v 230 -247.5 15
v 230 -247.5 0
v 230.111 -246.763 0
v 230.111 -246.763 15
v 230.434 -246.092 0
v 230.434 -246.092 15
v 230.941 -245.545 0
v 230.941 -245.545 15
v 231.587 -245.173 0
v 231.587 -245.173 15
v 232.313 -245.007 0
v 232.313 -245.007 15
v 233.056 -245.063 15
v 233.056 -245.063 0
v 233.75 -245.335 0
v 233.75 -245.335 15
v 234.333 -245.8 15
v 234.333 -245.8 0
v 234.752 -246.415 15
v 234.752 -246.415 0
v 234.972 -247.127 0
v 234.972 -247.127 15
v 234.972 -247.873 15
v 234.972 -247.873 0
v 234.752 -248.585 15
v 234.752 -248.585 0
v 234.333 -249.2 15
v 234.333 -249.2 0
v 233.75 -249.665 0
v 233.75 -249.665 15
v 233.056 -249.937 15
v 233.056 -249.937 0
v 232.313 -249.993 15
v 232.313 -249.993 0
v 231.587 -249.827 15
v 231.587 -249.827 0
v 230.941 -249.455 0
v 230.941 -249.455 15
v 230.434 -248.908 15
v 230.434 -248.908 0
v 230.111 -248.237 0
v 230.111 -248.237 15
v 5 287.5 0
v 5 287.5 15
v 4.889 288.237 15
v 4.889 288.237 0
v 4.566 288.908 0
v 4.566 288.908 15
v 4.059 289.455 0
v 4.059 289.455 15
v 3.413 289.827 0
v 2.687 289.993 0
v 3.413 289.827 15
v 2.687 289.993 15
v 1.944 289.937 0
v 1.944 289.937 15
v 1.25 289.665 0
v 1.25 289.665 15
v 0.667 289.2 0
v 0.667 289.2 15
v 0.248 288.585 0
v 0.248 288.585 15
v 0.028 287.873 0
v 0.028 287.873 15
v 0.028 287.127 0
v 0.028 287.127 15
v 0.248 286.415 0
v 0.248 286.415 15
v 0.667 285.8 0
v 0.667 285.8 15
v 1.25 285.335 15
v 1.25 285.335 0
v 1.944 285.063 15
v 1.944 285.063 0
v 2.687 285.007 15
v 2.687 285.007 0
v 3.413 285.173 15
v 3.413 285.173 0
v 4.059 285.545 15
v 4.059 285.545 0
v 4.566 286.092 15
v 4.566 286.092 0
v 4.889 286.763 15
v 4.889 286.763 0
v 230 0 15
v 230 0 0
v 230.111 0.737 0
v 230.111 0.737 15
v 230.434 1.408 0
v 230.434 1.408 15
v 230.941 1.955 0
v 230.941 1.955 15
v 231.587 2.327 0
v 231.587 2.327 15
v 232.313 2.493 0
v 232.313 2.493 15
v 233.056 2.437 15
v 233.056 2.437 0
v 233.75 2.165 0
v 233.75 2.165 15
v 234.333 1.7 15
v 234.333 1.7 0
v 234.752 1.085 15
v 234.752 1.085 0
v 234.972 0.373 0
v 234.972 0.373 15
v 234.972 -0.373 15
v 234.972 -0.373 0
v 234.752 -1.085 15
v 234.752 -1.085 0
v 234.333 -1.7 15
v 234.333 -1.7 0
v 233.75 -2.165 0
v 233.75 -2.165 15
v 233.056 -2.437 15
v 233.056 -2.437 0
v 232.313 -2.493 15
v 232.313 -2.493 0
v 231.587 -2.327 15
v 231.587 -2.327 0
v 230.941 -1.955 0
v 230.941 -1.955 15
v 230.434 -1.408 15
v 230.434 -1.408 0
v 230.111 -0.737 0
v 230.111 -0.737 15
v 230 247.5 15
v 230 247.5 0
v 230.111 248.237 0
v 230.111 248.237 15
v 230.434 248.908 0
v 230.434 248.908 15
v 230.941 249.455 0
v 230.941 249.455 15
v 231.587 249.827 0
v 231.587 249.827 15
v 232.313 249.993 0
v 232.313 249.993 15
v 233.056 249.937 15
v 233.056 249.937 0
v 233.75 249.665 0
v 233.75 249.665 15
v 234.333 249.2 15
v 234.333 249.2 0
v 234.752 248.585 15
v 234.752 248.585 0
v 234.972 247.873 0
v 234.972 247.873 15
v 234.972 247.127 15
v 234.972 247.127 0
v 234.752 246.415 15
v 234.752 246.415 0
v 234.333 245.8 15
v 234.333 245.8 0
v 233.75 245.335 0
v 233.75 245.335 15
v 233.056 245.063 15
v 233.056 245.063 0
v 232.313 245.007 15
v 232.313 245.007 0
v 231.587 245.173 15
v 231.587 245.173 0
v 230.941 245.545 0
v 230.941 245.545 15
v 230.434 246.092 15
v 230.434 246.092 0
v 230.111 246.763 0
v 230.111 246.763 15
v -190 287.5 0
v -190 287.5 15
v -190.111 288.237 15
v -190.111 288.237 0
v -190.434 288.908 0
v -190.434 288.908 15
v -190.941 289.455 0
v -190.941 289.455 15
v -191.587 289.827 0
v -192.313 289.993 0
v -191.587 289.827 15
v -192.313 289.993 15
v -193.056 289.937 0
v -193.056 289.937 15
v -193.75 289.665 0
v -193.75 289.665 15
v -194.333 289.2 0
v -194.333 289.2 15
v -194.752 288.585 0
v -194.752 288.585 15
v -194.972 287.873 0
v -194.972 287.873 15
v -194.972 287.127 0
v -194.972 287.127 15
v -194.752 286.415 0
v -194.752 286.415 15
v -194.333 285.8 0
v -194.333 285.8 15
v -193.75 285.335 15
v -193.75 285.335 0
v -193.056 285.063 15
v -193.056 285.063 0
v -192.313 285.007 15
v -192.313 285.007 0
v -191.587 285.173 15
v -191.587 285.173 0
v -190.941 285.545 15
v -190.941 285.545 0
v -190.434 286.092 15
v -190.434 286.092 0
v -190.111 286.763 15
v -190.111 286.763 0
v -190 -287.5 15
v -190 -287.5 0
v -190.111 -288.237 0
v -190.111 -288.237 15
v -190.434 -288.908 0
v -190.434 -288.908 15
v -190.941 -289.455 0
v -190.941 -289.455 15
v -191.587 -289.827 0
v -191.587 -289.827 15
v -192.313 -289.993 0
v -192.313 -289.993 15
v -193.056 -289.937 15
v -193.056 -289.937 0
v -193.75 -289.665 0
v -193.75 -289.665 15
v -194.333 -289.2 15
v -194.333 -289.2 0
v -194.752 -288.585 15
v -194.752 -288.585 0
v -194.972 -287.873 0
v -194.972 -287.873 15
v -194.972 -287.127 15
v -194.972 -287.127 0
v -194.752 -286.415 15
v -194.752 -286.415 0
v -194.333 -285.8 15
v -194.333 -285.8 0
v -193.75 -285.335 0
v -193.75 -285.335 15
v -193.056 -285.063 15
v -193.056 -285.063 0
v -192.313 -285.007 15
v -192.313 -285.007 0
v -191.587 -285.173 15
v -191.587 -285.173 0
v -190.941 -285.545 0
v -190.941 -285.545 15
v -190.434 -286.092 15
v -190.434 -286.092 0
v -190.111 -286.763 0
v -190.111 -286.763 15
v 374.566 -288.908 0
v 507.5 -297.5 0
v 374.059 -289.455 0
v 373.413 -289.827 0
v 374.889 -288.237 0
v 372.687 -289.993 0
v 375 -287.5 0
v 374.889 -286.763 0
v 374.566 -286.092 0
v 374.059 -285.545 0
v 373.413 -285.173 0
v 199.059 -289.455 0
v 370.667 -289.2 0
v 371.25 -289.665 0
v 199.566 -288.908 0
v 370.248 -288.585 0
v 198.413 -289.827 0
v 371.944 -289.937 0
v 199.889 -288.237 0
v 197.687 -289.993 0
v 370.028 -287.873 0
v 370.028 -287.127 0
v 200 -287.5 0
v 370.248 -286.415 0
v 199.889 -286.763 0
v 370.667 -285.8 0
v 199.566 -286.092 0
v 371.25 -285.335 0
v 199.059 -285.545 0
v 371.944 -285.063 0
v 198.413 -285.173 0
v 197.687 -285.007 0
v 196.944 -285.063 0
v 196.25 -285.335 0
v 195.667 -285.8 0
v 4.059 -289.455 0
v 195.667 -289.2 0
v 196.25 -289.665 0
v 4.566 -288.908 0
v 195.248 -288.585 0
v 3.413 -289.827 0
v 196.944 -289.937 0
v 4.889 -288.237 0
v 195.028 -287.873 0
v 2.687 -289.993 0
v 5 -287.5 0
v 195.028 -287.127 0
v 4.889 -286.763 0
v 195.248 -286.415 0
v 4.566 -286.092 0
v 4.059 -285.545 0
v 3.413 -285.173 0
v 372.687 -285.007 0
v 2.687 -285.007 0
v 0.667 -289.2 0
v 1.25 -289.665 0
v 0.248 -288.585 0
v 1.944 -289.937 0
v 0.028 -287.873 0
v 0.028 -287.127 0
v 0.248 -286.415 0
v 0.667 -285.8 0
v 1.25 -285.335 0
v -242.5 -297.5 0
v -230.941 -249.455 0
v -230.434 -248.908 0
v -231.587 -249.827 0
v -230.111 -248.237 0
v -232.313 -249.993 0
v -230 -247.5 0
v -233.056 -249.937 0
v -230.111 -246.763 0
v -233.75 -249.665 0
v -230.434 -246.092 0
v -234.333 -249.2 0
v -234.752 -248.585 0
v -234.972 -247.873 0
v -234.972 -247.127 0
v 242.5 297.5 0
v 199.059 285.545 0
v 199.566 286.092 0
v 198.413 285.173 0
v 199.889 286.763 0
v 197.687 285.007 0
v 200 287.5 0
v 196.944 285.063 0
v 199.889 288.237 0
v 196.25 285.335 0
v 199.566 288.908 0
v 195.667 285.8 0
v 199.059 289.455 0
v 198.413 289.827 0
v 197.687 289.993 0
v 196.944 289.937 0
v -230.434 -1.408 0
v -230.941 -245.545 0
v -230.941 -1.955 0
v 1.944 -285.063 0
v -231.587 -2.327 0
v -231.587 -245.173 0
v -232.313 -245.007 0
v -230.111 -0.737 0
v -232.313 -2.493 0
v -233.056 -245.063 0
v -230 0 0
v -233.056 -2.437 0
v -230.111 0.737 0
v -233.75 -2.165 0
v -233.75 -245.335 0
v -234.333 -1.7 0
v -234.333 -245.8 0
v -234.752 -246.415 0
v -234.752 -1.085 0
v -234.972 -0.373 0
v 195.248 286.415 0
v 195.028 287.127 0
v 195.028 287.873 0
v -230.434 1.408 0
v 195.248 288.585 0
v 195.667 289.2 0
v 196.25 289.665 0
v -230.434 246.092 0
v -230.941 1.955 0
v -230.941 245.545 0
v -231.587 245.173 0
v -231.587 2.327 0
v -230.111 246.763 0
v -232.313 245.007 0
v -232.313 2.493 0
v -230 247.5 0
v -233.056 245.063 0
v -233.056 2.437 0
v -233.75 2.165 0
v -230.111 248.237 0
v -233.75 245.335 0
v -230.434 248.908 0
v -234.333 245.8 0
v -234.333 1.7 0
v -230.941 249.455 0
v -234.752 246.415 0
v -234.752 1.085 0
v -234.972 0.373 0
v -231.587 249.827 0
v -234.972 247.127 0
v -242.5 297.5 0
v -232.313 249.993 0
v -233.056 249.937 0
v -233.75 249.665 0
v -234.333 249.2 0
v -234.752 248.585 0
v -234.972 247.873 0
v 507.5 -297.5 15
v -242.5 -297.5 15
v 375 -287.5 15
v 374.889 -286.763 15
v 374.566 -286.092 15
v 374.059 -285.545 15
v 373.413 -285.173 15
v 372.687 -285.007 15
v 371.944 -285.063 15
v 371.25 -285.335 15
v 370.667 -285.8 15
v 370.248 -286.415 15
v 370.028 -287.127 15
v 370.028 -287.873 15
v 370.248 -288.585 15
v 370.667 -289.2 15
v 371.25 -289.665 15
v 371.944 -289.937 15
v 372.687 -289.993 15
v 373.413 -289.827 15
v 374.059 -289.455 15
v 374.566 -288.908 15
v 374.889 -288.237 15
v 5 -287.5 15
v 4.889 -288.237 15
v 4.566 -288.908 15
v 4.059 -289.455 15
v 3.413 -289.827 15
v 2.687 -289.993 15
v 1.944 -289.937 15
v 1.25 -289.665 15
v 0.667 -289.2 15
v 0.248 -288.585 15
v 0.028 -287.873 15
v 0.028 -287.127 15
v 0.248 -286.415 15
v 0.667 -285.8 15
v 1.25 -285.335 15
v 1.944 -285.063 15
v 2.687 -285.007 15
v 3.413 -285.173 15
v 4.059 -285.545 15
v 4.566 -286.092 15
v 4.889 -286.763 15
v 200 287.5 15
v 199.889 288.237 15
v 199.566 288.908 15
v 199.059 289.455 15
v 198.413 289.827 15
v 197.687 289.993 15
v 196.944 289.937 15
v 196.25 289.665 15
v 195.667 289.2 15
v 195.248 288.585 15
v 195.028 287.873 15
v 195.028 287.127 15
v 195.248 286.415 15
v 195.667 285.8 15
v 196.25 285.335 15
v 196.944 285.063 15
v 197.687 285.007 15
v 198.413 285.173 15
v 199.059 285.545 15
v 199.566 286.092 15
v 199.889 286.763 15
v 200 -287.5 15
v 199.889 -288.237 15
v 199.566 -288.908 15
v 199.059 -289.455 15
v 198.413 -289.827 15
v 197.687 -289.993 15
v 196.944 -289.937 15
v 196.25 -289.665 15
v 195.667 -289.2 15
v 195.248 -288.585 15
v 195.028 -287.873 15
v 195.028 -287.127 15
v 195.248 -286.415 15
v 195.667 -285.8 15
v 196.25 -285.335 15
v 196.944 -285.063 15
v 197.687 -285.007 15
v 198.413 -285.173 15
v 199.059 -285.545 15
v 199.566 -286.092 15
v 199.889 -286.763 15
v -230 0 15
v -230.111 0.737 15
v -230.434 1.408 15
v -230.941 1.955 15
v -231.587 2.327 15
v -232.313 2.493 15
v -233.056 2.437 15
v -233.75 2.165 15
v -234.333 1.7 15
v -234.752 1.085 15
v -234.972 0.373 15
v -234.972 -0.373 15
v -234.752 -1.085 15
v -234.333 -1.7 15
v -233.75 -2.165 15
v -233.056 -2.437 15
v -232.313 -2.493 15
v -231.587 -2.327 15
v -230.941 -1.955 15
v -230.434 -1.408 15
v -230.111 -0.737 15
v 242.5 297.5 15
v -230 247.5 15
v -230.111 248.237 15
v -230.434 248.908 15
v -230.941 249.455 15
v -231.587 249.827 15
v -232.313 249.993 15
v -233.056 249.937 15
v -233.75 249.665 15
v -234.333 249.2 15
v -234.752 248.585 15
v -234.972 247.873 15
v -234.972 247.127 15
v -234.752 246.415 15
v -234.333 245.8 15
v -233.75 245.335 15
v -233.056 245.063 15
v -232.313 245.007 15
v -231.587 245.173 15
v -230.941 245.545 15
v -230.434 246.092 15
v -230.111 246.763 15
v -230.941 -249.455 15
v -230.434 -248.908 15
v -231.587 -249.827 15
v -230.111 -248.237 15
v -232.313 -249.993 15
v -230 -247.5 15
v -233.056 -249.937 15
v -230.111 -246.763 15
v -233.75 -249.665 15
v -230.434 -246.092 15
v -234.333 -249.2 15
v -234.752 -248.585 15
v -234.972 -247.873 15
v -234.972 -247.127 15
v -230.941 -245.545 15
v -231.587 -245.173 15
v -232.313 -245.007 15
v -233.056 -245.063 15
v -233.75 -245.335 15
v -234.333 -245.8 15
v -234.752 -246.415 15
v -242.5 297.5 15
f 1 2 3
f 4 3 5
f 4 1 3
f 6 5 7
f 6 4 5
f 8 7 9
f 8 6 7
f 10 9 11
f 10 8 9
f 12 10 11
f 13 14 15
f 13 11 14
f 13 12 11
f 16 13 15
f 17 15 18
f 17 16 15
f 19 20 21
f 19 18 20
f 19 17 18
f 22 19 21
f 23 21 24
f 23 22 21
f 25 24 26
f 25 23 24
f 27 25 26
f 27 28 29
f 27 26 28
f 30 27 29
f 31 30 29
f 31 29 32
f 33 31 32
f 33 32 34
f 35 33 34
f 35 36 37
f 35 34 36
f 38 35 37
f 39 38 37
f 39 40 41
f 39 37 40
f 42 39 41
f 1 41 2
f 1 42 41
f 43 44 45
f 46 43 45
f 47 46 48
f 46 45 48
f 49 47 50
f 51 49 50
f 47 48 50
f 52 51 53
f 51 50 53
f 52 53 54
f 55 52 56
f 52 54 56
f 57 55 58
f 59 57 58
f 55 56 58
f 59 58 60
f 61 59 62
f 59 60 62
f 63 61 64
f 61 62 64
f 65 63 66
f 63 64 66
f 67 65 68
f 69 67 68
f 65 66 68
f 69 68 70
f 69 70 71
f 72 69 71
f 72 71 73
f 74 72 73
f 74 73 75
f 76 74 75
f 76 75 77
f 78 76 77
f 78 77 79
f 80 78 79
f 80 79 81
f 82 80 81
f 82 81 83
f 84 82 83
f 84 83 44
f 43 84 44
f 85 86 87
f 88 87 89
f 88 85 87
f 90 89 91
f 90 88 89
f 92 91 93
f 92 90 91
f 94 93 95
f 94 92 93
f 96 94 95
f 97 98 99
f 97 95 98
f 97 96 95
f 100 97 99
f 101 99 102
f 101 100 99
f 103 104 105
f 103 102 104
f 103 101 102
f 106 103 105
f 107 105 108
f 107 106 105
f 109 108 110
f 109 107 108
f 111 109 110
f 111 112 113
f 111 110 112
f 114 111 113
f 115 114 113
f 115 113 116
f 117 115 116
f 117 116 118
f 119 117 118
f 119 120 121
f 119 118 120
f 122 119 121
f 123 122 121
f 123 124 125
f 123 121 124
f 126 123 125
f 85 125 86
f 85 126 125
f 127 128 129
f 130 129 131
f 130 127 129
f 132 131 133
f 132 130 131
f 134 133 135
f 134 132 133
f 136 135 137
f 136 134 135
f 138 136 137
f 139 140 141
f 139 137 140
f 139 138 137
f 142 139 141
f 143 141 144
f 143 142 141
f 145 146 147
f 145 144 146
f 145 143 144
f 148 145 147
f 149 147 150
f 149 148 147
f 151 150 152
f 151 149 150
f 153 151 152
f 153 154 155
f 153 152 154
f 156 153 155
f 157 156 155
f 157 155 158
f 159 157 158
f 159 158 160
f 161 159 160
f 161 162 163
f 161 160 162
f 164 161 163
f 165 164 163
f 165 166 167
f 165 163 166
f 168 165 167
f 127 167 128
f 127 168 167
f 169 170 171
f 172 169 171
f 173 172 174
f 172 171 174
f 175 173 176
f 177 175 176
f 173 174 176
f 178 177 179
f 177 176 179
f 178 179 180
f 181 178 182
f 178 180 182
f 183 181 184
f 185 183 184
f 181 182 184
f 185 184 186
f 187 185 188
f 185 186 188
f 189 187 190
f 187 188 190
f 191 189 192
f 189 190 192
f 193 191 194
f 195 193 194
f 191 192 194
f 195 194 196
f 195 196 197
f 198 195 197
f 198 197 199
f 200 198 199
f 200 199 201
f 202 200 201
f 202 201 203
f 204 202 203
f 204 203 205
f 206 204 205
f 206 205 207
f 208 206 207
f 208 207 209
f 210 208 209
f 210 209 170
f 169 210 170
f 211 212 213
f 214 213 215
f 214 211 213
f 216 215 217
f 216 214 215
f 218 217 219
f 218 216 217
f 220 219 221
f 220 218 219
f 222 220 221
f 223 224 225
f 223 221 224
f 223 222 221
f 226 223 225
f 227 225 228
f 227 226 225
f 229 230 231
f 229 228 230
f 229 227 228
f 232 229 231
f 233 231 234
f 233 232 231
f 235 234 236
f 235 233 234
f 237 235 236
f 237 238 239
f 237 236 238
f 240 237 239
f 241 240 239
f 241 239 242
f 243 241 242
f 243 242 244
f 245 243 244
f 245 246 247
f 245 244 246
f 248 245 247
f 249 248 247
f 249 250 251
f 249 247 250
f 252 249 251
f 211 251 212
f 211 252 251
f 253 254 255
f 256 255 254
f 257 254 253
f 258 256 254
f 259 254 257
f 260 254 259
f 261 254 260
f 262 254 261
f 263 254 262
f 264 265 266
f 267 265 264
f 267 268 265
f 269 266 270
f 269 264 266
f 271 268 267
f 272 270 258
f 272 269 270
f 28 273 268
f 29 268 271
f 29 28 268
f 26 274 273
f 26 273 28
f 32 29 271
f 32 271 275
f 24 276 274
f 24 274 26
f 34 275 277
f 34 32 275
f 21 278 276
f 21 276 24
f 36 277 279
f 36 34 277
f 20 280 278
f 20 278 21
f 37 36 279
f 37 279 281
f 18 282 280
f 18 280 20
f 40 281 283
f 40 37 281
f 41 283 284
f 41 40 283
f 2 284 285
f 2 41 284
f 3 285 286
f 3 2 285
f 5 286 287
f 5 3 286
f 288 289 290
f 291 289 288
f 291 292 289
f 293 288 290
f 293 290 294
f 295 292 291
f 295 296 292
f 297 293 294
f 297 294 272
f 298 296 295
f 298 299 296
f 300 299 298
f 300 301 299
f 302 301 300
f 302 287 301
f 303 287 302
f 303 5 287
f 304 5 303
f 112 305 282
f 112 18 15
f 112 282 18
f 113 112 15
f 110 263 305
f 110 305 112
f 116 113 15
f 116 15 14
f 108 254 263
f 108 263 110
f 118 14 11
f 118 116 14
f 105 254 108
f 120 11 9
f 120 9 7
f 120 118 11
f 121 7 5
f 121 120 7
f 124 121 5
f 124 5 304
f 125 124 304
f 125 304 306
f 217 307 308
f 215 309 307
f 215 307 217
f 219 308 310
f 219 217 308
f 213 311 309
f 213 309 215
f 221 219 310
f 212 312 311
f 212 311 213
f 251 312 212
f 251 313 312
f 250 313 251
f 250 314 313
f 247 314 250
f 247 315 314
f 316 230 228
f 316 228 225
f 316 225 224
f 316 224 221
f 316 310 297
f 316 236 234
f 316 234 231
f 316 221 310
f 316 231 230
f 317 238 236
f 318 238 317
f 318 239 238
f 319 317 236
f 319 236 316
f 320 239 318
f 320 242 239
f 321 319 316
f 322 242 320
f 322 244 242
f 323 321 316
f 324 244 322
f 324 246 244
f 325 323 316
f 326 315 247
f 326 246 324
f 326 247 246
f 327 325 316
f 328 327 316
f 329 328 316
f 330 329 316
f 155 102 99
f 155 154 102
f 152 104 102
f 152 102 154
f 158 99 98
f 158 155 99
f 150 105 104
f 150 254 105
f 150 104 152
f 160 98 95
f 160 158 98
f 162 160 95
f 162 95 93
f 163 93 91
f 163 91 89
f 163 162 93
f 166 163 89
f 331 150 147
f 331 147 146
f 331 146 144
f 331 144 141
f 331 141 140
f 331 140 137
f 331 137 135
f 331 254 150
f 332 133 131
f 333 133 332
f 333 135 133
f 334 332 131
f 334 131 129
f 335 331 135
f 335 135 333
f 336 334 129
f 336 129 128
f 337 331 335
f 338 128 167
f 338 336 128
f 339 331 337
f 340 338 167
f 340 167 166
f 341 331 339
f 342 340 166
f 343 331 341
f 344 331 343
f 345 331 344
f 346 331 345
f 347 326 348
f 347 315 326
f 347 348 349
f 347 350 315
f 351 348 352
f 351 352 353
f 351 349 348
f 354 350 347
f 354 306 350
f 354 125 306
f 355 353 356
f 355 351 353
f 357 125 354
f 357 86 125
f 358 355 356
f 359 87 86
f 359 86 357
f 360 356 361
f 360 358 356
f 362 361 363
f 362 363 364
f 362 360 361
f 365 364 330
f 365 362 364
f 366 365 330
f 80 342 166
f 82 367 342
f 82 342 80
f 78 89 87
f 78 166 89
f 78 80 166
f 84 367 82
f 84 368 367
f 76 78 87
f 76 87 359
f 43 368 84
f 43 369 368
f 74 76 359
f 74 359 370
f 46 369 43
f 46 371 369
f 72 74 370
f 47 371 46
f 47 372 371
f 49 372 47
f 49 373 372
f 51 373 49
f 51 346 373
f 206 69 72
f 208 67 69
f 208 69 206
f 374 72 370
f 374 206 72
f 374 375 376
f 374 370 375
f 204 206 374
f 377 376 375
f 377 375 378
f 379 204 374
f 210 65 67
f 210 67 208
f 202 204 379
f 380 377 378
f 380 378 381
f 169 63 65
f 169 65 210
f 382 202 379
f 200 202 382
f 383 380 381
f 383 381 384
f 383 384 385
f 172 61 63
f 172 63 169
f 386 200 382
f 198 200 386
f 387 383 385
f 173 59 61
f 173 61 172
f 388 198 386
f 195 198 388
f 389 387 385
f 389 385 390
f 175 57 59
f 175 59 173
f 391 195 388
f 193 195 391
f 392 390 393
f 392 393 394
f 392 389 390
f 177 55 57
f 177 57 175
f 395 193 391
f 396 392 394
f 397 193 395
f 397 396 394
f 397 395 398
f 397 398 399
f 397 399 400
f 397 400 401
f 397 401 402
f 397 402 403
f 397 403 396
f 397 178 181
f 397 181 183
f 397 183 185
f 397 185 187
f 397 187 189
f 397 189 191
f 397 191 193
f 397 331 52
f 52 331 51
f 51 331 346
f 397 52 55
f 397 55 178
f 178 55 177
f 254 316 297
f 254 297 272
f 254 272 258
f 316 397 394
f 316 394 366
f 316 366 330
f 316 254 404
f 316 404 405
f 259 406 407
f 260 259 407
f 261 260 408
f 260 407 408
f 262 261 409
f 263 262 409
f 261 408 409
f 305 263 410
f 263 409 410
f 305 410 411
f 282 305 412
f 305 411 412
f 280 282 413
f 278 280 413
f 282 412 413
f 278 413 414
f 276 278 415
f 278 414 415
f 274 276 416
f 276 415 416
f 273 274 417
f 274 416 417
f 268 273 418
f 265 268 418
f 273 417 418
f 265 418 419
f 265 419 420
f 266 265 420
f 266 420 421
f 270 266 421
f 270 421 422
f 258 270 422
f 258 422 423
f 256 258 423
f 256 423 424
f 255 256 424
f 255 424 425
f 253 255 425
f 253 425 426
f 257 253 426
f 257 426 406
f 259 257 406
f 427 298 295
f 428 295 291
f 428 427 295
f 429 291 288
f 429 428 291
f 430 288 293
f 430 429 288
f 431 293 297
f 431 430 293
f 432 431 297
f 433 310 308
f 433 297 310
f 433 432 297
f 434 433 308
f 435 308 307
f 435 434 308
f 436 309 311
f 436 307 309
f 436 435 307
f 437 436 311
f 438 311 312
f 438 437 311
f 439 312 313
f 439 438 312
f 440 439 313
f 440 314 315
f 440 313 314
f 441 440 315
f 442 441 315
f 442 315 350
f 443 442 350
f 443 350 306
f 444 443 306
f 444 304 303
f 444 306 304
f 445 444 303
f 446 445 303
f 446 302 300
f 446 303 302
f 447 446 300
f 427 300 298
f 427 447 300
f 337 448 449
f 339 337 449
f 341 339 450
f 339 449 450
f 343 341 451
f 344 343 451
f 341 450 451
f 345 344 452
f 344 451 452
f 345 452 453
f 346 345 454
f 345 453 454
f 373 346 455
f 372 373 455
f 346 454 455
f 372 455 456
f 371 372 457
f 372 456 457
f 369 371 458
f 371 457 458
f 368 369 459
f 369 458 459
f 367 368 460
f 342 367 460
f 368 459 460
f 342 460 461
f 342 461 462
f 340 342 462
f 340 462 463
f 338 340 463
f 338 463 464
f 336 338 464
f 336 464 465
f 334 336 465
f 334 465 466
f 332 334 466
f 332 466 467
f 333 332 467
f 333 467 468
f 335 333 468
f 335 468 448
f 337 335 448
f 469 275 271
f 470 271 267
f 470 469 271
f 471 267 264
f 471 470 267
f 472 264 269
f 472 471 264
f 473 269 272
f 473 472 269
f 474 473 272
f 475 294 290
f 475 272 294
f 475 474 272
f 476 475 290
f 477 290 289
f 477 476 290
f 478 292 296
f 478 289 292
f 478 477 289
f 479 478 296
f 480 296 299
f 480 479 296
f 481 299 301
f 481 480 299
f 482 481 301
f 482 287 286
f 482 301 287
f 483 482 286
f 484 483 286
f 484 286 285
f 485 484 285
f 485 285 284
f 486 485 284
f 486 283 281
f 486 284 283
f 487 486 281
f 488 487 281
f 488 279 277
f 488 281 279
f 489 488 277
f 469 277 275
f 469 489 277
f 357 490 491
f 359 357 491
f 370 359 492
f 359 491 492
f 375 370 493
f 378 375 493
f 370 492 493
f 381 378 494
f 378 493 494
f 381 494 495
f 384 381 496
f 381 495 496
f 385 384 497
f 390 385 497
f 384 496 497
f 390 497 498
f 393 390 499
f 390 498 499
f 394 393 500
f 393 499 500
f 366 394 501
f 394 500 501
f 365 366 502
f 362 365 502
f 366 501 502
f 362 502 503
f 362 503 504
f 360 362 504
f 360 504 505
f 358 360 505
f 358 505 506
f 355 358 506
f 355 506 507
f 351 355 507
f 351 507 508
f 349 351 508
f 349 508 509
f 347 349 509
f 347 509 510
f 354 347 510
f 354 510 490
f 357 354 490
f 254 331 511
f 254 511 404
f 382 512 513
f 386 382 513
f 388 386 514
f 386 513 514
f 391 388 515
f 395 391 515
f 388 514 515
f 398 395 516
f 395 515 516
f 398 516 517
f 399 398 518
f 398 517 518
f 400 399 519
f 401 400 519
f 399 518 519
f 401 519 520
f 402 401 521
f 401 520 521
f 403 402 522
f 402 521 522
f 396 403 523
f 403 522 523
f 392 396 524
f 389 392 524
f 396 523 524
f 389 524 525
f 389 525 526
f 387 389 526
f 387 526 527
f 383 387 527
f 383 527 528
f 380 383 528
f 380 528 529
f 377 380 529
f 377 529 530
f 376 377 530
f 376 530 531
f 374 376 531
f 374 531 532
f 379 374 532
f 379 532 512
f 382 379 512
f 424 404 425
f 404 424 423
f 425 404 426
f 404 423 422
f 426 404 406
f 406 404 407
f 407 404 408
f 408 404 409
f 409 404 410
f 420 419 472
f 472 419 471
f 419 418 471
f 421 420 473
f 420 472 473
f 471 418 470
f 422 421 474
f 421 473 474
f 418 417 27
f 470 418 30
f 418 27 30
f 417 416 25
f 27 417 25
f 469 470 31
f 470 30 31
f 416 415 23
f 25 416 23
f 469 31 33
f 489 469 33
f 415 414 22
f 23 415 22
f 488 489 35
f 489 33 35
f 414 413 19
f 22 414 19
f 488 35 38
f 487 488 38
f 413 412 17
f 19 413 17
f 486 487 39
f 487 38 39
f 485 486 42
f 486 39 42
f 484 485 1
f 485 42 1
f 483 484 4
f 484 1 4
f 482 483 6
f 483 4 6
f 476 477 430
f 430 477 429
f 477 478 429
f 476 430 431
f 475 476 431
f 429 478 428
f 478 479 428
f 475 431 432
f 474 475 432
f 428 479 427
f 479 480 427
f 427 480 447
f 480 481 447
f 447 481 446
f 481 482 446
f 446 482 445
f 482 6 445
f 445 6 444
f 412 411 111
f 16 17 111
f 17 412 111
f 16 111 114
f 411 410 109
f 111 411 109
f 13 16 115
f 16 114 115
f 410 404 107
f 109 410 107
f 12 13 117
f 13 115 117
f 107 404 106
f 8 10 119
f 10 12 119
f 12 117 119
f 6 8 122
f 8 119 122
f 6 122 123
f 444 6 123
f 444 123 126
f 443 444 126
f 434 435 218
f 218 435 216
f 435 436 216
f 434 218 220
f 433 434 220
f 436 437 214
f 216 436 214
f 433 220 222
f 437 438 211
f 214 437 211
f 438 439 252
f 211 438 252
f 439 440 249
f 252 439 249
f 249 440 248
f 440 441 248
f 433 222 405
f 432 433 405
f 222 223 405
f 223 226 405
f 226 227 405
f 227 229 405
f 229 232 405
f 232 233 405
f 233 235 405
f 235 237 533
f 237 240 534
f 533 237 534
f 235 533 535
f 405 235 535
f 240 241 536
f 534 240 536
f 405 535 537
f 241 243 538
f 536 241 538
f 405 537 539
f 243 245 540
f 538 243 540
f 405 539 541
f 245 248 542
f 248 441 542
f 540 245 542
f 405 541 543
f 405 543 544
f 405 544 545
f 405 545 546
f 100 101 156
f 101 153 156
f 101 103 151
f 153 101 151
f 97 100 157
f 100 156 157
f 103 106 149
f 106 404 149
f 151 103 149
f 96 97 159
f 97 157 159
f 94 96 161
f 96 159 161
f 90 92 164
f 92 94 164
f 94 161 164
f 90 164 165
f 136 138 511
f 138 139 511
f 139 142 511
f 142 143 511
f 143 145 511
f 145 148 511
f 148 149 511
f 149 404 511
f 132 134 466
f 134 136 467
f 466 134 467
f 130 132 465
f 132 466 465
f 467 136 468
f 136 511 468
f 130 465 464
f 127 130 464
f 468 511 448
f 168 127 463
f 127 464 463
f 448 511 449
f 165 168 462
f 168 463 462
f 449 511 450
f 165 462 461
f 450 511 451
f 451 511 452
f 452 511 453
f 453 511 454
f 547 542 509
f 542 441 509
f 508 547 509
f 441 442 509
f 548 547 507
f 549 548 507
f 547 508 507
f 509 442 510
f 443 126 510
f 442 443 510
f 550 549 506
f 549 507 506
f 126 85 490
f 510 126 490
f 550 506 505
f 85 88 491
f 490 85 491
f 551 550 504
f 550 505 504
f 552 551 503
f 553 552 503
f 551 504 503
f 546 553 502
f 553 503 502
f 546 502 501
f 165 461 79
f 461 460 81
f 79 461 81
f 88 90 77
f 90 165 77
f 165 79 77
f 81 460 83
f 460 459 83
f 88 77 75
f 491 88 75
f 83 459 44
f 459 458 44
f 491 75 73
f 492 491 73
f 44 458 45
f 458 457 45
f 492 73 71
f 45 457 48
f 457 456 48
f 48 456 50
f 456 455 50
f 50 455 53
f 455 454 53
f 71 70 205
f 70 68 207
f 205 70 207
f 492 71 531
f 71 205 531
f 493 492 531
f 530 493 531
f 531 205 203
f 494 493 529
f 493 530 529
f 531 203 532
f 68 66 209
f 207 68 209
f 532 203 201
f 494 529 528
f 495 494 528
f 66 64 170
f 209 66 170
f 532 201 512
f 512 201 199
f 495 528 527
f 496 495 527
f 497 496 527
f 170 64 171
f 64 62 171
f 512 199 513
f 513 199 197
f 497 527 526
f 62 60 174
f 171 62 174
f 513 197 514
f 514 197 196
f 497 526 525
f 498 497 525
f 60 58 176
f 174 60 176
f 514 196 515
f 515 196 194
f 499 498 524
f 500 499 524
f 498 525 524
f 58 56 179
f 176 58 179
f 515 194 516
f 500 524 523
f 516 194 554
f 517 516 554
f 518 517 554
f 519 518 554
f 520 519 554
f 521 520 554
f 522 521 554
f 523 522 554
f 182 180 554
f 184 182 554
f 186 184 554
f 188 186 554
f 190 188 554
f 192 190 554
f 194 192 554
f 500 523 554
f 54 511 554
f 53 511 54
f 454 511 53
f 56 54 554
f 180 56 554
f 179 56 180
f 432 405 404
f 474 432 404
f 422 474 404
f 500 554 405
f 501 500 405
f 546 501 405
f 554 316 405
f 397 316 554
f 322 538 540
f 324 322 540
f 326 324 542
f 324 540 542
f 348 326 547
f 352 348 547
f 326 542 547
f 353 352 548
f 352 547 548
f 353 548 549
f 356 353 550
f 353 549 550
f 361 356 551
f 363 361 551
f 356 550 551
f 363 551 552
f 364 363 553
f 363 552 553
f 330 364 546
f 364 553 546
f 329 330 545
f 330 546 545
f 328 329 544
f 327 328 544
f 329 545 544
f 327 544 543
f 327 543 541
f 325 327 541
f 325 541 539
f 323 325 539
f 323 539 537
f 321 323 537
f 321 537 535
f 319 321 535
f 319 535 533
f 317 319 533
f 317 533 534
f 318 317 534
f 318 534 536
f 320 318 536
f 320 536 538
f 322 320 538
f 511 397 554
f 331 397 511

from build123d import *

# Parameters (mm, degrees)
EXTRUDE_1_DEPTH     = 15
SKETCH_2_R          = 2.5
CUT_EXTRUDE_1_DEPTH = 589.461978381
SKETCH_2_3_R        = 2.5
CUT_EXTRUDE_2_DEPTH = 589.461978381
SKETCH_4_R          = 2.5
CUT_EXTRUDE_3_DEPTH = 589.461978381


with BuildPart() as part:
    # ｽｹｯﾁ1 → ﾎﾞｽ - 押し出し1 (new body)
    with BuildSketch(Plane.XY):
        Polygon((-242.5, 297.5), (242.5, 297.5), (507.5, -297.5), (-242.5, -297.5), align=None)
    extrude(amount=EXTRUDE_1_DEPTH)

    # ｽｹｯﾁ2 → ｶｯﾄ - 押し出し1 (cut, through all)
    with BuildSketch(Plane.XY.offset(15)):
        with Locations((-192.5, 287.5)):
            Circle(SKETCH_2_R)
        with Locations((2.5, 287.5)):
            Circle(SKETCH_2_R)
        with Locations((197.5, 287.5)):
            Circle(SKETCH_2_R)
    cut_extrude_1 = extrude(amount=-CUT_EXTRUDE_1_DEPTH, mode=Mode.SUBTRACT)

    # ｽｹｯﾁ2<3> → ｶｯﾄ - 押し出し2 (cut, through all)
    with BuildSketch(Plane.XY.offset(15)):
        with Locations((-232.5, 247.5)):
            Circle(SKETCH_2_3_R)
        with Locations((-232.5, 0)):
            Circle(SKETCH_2_3_R)
        with Locations((-232.5, -247.5)):
            Circle(SKETCH_2_3_R)
    cut_extrude_2 = extrude(amount=-CUT_EXTRUDE_2_DEPTH, mode=Mode.SUBTRACT)

    # ﾐﾗｰ1: ｶｯﾄ - 押し出し1 across plane
    add(cut_extrude_1.mirror(Plane.ZX), mode=Mode.SUBTRACT)

    # ﾐﾗｰ2: ｶｯﾄ - 押し出し2 across plane
    add(cut_extrude_2.mirror(Plane(origin=(0, 0, 0), x_dir=(0, 0, 1), z_dir=(1, 0, 0))), mode=Mode.SUBTRACT)

    # ｽｹｯﾁ4 → ｶｯﾄ - 押し出し3 (cut, through all)
    with BuildSketch(Plane.XY.offset(15)):
        with Locations((372.5, -287.5)):
            Circle(SKETCH_4_R)
    extrude(amount=-CUT_EXTRUDE_3_DEPTH, mode=Mode.SUBTRACT)


solid = part.part
